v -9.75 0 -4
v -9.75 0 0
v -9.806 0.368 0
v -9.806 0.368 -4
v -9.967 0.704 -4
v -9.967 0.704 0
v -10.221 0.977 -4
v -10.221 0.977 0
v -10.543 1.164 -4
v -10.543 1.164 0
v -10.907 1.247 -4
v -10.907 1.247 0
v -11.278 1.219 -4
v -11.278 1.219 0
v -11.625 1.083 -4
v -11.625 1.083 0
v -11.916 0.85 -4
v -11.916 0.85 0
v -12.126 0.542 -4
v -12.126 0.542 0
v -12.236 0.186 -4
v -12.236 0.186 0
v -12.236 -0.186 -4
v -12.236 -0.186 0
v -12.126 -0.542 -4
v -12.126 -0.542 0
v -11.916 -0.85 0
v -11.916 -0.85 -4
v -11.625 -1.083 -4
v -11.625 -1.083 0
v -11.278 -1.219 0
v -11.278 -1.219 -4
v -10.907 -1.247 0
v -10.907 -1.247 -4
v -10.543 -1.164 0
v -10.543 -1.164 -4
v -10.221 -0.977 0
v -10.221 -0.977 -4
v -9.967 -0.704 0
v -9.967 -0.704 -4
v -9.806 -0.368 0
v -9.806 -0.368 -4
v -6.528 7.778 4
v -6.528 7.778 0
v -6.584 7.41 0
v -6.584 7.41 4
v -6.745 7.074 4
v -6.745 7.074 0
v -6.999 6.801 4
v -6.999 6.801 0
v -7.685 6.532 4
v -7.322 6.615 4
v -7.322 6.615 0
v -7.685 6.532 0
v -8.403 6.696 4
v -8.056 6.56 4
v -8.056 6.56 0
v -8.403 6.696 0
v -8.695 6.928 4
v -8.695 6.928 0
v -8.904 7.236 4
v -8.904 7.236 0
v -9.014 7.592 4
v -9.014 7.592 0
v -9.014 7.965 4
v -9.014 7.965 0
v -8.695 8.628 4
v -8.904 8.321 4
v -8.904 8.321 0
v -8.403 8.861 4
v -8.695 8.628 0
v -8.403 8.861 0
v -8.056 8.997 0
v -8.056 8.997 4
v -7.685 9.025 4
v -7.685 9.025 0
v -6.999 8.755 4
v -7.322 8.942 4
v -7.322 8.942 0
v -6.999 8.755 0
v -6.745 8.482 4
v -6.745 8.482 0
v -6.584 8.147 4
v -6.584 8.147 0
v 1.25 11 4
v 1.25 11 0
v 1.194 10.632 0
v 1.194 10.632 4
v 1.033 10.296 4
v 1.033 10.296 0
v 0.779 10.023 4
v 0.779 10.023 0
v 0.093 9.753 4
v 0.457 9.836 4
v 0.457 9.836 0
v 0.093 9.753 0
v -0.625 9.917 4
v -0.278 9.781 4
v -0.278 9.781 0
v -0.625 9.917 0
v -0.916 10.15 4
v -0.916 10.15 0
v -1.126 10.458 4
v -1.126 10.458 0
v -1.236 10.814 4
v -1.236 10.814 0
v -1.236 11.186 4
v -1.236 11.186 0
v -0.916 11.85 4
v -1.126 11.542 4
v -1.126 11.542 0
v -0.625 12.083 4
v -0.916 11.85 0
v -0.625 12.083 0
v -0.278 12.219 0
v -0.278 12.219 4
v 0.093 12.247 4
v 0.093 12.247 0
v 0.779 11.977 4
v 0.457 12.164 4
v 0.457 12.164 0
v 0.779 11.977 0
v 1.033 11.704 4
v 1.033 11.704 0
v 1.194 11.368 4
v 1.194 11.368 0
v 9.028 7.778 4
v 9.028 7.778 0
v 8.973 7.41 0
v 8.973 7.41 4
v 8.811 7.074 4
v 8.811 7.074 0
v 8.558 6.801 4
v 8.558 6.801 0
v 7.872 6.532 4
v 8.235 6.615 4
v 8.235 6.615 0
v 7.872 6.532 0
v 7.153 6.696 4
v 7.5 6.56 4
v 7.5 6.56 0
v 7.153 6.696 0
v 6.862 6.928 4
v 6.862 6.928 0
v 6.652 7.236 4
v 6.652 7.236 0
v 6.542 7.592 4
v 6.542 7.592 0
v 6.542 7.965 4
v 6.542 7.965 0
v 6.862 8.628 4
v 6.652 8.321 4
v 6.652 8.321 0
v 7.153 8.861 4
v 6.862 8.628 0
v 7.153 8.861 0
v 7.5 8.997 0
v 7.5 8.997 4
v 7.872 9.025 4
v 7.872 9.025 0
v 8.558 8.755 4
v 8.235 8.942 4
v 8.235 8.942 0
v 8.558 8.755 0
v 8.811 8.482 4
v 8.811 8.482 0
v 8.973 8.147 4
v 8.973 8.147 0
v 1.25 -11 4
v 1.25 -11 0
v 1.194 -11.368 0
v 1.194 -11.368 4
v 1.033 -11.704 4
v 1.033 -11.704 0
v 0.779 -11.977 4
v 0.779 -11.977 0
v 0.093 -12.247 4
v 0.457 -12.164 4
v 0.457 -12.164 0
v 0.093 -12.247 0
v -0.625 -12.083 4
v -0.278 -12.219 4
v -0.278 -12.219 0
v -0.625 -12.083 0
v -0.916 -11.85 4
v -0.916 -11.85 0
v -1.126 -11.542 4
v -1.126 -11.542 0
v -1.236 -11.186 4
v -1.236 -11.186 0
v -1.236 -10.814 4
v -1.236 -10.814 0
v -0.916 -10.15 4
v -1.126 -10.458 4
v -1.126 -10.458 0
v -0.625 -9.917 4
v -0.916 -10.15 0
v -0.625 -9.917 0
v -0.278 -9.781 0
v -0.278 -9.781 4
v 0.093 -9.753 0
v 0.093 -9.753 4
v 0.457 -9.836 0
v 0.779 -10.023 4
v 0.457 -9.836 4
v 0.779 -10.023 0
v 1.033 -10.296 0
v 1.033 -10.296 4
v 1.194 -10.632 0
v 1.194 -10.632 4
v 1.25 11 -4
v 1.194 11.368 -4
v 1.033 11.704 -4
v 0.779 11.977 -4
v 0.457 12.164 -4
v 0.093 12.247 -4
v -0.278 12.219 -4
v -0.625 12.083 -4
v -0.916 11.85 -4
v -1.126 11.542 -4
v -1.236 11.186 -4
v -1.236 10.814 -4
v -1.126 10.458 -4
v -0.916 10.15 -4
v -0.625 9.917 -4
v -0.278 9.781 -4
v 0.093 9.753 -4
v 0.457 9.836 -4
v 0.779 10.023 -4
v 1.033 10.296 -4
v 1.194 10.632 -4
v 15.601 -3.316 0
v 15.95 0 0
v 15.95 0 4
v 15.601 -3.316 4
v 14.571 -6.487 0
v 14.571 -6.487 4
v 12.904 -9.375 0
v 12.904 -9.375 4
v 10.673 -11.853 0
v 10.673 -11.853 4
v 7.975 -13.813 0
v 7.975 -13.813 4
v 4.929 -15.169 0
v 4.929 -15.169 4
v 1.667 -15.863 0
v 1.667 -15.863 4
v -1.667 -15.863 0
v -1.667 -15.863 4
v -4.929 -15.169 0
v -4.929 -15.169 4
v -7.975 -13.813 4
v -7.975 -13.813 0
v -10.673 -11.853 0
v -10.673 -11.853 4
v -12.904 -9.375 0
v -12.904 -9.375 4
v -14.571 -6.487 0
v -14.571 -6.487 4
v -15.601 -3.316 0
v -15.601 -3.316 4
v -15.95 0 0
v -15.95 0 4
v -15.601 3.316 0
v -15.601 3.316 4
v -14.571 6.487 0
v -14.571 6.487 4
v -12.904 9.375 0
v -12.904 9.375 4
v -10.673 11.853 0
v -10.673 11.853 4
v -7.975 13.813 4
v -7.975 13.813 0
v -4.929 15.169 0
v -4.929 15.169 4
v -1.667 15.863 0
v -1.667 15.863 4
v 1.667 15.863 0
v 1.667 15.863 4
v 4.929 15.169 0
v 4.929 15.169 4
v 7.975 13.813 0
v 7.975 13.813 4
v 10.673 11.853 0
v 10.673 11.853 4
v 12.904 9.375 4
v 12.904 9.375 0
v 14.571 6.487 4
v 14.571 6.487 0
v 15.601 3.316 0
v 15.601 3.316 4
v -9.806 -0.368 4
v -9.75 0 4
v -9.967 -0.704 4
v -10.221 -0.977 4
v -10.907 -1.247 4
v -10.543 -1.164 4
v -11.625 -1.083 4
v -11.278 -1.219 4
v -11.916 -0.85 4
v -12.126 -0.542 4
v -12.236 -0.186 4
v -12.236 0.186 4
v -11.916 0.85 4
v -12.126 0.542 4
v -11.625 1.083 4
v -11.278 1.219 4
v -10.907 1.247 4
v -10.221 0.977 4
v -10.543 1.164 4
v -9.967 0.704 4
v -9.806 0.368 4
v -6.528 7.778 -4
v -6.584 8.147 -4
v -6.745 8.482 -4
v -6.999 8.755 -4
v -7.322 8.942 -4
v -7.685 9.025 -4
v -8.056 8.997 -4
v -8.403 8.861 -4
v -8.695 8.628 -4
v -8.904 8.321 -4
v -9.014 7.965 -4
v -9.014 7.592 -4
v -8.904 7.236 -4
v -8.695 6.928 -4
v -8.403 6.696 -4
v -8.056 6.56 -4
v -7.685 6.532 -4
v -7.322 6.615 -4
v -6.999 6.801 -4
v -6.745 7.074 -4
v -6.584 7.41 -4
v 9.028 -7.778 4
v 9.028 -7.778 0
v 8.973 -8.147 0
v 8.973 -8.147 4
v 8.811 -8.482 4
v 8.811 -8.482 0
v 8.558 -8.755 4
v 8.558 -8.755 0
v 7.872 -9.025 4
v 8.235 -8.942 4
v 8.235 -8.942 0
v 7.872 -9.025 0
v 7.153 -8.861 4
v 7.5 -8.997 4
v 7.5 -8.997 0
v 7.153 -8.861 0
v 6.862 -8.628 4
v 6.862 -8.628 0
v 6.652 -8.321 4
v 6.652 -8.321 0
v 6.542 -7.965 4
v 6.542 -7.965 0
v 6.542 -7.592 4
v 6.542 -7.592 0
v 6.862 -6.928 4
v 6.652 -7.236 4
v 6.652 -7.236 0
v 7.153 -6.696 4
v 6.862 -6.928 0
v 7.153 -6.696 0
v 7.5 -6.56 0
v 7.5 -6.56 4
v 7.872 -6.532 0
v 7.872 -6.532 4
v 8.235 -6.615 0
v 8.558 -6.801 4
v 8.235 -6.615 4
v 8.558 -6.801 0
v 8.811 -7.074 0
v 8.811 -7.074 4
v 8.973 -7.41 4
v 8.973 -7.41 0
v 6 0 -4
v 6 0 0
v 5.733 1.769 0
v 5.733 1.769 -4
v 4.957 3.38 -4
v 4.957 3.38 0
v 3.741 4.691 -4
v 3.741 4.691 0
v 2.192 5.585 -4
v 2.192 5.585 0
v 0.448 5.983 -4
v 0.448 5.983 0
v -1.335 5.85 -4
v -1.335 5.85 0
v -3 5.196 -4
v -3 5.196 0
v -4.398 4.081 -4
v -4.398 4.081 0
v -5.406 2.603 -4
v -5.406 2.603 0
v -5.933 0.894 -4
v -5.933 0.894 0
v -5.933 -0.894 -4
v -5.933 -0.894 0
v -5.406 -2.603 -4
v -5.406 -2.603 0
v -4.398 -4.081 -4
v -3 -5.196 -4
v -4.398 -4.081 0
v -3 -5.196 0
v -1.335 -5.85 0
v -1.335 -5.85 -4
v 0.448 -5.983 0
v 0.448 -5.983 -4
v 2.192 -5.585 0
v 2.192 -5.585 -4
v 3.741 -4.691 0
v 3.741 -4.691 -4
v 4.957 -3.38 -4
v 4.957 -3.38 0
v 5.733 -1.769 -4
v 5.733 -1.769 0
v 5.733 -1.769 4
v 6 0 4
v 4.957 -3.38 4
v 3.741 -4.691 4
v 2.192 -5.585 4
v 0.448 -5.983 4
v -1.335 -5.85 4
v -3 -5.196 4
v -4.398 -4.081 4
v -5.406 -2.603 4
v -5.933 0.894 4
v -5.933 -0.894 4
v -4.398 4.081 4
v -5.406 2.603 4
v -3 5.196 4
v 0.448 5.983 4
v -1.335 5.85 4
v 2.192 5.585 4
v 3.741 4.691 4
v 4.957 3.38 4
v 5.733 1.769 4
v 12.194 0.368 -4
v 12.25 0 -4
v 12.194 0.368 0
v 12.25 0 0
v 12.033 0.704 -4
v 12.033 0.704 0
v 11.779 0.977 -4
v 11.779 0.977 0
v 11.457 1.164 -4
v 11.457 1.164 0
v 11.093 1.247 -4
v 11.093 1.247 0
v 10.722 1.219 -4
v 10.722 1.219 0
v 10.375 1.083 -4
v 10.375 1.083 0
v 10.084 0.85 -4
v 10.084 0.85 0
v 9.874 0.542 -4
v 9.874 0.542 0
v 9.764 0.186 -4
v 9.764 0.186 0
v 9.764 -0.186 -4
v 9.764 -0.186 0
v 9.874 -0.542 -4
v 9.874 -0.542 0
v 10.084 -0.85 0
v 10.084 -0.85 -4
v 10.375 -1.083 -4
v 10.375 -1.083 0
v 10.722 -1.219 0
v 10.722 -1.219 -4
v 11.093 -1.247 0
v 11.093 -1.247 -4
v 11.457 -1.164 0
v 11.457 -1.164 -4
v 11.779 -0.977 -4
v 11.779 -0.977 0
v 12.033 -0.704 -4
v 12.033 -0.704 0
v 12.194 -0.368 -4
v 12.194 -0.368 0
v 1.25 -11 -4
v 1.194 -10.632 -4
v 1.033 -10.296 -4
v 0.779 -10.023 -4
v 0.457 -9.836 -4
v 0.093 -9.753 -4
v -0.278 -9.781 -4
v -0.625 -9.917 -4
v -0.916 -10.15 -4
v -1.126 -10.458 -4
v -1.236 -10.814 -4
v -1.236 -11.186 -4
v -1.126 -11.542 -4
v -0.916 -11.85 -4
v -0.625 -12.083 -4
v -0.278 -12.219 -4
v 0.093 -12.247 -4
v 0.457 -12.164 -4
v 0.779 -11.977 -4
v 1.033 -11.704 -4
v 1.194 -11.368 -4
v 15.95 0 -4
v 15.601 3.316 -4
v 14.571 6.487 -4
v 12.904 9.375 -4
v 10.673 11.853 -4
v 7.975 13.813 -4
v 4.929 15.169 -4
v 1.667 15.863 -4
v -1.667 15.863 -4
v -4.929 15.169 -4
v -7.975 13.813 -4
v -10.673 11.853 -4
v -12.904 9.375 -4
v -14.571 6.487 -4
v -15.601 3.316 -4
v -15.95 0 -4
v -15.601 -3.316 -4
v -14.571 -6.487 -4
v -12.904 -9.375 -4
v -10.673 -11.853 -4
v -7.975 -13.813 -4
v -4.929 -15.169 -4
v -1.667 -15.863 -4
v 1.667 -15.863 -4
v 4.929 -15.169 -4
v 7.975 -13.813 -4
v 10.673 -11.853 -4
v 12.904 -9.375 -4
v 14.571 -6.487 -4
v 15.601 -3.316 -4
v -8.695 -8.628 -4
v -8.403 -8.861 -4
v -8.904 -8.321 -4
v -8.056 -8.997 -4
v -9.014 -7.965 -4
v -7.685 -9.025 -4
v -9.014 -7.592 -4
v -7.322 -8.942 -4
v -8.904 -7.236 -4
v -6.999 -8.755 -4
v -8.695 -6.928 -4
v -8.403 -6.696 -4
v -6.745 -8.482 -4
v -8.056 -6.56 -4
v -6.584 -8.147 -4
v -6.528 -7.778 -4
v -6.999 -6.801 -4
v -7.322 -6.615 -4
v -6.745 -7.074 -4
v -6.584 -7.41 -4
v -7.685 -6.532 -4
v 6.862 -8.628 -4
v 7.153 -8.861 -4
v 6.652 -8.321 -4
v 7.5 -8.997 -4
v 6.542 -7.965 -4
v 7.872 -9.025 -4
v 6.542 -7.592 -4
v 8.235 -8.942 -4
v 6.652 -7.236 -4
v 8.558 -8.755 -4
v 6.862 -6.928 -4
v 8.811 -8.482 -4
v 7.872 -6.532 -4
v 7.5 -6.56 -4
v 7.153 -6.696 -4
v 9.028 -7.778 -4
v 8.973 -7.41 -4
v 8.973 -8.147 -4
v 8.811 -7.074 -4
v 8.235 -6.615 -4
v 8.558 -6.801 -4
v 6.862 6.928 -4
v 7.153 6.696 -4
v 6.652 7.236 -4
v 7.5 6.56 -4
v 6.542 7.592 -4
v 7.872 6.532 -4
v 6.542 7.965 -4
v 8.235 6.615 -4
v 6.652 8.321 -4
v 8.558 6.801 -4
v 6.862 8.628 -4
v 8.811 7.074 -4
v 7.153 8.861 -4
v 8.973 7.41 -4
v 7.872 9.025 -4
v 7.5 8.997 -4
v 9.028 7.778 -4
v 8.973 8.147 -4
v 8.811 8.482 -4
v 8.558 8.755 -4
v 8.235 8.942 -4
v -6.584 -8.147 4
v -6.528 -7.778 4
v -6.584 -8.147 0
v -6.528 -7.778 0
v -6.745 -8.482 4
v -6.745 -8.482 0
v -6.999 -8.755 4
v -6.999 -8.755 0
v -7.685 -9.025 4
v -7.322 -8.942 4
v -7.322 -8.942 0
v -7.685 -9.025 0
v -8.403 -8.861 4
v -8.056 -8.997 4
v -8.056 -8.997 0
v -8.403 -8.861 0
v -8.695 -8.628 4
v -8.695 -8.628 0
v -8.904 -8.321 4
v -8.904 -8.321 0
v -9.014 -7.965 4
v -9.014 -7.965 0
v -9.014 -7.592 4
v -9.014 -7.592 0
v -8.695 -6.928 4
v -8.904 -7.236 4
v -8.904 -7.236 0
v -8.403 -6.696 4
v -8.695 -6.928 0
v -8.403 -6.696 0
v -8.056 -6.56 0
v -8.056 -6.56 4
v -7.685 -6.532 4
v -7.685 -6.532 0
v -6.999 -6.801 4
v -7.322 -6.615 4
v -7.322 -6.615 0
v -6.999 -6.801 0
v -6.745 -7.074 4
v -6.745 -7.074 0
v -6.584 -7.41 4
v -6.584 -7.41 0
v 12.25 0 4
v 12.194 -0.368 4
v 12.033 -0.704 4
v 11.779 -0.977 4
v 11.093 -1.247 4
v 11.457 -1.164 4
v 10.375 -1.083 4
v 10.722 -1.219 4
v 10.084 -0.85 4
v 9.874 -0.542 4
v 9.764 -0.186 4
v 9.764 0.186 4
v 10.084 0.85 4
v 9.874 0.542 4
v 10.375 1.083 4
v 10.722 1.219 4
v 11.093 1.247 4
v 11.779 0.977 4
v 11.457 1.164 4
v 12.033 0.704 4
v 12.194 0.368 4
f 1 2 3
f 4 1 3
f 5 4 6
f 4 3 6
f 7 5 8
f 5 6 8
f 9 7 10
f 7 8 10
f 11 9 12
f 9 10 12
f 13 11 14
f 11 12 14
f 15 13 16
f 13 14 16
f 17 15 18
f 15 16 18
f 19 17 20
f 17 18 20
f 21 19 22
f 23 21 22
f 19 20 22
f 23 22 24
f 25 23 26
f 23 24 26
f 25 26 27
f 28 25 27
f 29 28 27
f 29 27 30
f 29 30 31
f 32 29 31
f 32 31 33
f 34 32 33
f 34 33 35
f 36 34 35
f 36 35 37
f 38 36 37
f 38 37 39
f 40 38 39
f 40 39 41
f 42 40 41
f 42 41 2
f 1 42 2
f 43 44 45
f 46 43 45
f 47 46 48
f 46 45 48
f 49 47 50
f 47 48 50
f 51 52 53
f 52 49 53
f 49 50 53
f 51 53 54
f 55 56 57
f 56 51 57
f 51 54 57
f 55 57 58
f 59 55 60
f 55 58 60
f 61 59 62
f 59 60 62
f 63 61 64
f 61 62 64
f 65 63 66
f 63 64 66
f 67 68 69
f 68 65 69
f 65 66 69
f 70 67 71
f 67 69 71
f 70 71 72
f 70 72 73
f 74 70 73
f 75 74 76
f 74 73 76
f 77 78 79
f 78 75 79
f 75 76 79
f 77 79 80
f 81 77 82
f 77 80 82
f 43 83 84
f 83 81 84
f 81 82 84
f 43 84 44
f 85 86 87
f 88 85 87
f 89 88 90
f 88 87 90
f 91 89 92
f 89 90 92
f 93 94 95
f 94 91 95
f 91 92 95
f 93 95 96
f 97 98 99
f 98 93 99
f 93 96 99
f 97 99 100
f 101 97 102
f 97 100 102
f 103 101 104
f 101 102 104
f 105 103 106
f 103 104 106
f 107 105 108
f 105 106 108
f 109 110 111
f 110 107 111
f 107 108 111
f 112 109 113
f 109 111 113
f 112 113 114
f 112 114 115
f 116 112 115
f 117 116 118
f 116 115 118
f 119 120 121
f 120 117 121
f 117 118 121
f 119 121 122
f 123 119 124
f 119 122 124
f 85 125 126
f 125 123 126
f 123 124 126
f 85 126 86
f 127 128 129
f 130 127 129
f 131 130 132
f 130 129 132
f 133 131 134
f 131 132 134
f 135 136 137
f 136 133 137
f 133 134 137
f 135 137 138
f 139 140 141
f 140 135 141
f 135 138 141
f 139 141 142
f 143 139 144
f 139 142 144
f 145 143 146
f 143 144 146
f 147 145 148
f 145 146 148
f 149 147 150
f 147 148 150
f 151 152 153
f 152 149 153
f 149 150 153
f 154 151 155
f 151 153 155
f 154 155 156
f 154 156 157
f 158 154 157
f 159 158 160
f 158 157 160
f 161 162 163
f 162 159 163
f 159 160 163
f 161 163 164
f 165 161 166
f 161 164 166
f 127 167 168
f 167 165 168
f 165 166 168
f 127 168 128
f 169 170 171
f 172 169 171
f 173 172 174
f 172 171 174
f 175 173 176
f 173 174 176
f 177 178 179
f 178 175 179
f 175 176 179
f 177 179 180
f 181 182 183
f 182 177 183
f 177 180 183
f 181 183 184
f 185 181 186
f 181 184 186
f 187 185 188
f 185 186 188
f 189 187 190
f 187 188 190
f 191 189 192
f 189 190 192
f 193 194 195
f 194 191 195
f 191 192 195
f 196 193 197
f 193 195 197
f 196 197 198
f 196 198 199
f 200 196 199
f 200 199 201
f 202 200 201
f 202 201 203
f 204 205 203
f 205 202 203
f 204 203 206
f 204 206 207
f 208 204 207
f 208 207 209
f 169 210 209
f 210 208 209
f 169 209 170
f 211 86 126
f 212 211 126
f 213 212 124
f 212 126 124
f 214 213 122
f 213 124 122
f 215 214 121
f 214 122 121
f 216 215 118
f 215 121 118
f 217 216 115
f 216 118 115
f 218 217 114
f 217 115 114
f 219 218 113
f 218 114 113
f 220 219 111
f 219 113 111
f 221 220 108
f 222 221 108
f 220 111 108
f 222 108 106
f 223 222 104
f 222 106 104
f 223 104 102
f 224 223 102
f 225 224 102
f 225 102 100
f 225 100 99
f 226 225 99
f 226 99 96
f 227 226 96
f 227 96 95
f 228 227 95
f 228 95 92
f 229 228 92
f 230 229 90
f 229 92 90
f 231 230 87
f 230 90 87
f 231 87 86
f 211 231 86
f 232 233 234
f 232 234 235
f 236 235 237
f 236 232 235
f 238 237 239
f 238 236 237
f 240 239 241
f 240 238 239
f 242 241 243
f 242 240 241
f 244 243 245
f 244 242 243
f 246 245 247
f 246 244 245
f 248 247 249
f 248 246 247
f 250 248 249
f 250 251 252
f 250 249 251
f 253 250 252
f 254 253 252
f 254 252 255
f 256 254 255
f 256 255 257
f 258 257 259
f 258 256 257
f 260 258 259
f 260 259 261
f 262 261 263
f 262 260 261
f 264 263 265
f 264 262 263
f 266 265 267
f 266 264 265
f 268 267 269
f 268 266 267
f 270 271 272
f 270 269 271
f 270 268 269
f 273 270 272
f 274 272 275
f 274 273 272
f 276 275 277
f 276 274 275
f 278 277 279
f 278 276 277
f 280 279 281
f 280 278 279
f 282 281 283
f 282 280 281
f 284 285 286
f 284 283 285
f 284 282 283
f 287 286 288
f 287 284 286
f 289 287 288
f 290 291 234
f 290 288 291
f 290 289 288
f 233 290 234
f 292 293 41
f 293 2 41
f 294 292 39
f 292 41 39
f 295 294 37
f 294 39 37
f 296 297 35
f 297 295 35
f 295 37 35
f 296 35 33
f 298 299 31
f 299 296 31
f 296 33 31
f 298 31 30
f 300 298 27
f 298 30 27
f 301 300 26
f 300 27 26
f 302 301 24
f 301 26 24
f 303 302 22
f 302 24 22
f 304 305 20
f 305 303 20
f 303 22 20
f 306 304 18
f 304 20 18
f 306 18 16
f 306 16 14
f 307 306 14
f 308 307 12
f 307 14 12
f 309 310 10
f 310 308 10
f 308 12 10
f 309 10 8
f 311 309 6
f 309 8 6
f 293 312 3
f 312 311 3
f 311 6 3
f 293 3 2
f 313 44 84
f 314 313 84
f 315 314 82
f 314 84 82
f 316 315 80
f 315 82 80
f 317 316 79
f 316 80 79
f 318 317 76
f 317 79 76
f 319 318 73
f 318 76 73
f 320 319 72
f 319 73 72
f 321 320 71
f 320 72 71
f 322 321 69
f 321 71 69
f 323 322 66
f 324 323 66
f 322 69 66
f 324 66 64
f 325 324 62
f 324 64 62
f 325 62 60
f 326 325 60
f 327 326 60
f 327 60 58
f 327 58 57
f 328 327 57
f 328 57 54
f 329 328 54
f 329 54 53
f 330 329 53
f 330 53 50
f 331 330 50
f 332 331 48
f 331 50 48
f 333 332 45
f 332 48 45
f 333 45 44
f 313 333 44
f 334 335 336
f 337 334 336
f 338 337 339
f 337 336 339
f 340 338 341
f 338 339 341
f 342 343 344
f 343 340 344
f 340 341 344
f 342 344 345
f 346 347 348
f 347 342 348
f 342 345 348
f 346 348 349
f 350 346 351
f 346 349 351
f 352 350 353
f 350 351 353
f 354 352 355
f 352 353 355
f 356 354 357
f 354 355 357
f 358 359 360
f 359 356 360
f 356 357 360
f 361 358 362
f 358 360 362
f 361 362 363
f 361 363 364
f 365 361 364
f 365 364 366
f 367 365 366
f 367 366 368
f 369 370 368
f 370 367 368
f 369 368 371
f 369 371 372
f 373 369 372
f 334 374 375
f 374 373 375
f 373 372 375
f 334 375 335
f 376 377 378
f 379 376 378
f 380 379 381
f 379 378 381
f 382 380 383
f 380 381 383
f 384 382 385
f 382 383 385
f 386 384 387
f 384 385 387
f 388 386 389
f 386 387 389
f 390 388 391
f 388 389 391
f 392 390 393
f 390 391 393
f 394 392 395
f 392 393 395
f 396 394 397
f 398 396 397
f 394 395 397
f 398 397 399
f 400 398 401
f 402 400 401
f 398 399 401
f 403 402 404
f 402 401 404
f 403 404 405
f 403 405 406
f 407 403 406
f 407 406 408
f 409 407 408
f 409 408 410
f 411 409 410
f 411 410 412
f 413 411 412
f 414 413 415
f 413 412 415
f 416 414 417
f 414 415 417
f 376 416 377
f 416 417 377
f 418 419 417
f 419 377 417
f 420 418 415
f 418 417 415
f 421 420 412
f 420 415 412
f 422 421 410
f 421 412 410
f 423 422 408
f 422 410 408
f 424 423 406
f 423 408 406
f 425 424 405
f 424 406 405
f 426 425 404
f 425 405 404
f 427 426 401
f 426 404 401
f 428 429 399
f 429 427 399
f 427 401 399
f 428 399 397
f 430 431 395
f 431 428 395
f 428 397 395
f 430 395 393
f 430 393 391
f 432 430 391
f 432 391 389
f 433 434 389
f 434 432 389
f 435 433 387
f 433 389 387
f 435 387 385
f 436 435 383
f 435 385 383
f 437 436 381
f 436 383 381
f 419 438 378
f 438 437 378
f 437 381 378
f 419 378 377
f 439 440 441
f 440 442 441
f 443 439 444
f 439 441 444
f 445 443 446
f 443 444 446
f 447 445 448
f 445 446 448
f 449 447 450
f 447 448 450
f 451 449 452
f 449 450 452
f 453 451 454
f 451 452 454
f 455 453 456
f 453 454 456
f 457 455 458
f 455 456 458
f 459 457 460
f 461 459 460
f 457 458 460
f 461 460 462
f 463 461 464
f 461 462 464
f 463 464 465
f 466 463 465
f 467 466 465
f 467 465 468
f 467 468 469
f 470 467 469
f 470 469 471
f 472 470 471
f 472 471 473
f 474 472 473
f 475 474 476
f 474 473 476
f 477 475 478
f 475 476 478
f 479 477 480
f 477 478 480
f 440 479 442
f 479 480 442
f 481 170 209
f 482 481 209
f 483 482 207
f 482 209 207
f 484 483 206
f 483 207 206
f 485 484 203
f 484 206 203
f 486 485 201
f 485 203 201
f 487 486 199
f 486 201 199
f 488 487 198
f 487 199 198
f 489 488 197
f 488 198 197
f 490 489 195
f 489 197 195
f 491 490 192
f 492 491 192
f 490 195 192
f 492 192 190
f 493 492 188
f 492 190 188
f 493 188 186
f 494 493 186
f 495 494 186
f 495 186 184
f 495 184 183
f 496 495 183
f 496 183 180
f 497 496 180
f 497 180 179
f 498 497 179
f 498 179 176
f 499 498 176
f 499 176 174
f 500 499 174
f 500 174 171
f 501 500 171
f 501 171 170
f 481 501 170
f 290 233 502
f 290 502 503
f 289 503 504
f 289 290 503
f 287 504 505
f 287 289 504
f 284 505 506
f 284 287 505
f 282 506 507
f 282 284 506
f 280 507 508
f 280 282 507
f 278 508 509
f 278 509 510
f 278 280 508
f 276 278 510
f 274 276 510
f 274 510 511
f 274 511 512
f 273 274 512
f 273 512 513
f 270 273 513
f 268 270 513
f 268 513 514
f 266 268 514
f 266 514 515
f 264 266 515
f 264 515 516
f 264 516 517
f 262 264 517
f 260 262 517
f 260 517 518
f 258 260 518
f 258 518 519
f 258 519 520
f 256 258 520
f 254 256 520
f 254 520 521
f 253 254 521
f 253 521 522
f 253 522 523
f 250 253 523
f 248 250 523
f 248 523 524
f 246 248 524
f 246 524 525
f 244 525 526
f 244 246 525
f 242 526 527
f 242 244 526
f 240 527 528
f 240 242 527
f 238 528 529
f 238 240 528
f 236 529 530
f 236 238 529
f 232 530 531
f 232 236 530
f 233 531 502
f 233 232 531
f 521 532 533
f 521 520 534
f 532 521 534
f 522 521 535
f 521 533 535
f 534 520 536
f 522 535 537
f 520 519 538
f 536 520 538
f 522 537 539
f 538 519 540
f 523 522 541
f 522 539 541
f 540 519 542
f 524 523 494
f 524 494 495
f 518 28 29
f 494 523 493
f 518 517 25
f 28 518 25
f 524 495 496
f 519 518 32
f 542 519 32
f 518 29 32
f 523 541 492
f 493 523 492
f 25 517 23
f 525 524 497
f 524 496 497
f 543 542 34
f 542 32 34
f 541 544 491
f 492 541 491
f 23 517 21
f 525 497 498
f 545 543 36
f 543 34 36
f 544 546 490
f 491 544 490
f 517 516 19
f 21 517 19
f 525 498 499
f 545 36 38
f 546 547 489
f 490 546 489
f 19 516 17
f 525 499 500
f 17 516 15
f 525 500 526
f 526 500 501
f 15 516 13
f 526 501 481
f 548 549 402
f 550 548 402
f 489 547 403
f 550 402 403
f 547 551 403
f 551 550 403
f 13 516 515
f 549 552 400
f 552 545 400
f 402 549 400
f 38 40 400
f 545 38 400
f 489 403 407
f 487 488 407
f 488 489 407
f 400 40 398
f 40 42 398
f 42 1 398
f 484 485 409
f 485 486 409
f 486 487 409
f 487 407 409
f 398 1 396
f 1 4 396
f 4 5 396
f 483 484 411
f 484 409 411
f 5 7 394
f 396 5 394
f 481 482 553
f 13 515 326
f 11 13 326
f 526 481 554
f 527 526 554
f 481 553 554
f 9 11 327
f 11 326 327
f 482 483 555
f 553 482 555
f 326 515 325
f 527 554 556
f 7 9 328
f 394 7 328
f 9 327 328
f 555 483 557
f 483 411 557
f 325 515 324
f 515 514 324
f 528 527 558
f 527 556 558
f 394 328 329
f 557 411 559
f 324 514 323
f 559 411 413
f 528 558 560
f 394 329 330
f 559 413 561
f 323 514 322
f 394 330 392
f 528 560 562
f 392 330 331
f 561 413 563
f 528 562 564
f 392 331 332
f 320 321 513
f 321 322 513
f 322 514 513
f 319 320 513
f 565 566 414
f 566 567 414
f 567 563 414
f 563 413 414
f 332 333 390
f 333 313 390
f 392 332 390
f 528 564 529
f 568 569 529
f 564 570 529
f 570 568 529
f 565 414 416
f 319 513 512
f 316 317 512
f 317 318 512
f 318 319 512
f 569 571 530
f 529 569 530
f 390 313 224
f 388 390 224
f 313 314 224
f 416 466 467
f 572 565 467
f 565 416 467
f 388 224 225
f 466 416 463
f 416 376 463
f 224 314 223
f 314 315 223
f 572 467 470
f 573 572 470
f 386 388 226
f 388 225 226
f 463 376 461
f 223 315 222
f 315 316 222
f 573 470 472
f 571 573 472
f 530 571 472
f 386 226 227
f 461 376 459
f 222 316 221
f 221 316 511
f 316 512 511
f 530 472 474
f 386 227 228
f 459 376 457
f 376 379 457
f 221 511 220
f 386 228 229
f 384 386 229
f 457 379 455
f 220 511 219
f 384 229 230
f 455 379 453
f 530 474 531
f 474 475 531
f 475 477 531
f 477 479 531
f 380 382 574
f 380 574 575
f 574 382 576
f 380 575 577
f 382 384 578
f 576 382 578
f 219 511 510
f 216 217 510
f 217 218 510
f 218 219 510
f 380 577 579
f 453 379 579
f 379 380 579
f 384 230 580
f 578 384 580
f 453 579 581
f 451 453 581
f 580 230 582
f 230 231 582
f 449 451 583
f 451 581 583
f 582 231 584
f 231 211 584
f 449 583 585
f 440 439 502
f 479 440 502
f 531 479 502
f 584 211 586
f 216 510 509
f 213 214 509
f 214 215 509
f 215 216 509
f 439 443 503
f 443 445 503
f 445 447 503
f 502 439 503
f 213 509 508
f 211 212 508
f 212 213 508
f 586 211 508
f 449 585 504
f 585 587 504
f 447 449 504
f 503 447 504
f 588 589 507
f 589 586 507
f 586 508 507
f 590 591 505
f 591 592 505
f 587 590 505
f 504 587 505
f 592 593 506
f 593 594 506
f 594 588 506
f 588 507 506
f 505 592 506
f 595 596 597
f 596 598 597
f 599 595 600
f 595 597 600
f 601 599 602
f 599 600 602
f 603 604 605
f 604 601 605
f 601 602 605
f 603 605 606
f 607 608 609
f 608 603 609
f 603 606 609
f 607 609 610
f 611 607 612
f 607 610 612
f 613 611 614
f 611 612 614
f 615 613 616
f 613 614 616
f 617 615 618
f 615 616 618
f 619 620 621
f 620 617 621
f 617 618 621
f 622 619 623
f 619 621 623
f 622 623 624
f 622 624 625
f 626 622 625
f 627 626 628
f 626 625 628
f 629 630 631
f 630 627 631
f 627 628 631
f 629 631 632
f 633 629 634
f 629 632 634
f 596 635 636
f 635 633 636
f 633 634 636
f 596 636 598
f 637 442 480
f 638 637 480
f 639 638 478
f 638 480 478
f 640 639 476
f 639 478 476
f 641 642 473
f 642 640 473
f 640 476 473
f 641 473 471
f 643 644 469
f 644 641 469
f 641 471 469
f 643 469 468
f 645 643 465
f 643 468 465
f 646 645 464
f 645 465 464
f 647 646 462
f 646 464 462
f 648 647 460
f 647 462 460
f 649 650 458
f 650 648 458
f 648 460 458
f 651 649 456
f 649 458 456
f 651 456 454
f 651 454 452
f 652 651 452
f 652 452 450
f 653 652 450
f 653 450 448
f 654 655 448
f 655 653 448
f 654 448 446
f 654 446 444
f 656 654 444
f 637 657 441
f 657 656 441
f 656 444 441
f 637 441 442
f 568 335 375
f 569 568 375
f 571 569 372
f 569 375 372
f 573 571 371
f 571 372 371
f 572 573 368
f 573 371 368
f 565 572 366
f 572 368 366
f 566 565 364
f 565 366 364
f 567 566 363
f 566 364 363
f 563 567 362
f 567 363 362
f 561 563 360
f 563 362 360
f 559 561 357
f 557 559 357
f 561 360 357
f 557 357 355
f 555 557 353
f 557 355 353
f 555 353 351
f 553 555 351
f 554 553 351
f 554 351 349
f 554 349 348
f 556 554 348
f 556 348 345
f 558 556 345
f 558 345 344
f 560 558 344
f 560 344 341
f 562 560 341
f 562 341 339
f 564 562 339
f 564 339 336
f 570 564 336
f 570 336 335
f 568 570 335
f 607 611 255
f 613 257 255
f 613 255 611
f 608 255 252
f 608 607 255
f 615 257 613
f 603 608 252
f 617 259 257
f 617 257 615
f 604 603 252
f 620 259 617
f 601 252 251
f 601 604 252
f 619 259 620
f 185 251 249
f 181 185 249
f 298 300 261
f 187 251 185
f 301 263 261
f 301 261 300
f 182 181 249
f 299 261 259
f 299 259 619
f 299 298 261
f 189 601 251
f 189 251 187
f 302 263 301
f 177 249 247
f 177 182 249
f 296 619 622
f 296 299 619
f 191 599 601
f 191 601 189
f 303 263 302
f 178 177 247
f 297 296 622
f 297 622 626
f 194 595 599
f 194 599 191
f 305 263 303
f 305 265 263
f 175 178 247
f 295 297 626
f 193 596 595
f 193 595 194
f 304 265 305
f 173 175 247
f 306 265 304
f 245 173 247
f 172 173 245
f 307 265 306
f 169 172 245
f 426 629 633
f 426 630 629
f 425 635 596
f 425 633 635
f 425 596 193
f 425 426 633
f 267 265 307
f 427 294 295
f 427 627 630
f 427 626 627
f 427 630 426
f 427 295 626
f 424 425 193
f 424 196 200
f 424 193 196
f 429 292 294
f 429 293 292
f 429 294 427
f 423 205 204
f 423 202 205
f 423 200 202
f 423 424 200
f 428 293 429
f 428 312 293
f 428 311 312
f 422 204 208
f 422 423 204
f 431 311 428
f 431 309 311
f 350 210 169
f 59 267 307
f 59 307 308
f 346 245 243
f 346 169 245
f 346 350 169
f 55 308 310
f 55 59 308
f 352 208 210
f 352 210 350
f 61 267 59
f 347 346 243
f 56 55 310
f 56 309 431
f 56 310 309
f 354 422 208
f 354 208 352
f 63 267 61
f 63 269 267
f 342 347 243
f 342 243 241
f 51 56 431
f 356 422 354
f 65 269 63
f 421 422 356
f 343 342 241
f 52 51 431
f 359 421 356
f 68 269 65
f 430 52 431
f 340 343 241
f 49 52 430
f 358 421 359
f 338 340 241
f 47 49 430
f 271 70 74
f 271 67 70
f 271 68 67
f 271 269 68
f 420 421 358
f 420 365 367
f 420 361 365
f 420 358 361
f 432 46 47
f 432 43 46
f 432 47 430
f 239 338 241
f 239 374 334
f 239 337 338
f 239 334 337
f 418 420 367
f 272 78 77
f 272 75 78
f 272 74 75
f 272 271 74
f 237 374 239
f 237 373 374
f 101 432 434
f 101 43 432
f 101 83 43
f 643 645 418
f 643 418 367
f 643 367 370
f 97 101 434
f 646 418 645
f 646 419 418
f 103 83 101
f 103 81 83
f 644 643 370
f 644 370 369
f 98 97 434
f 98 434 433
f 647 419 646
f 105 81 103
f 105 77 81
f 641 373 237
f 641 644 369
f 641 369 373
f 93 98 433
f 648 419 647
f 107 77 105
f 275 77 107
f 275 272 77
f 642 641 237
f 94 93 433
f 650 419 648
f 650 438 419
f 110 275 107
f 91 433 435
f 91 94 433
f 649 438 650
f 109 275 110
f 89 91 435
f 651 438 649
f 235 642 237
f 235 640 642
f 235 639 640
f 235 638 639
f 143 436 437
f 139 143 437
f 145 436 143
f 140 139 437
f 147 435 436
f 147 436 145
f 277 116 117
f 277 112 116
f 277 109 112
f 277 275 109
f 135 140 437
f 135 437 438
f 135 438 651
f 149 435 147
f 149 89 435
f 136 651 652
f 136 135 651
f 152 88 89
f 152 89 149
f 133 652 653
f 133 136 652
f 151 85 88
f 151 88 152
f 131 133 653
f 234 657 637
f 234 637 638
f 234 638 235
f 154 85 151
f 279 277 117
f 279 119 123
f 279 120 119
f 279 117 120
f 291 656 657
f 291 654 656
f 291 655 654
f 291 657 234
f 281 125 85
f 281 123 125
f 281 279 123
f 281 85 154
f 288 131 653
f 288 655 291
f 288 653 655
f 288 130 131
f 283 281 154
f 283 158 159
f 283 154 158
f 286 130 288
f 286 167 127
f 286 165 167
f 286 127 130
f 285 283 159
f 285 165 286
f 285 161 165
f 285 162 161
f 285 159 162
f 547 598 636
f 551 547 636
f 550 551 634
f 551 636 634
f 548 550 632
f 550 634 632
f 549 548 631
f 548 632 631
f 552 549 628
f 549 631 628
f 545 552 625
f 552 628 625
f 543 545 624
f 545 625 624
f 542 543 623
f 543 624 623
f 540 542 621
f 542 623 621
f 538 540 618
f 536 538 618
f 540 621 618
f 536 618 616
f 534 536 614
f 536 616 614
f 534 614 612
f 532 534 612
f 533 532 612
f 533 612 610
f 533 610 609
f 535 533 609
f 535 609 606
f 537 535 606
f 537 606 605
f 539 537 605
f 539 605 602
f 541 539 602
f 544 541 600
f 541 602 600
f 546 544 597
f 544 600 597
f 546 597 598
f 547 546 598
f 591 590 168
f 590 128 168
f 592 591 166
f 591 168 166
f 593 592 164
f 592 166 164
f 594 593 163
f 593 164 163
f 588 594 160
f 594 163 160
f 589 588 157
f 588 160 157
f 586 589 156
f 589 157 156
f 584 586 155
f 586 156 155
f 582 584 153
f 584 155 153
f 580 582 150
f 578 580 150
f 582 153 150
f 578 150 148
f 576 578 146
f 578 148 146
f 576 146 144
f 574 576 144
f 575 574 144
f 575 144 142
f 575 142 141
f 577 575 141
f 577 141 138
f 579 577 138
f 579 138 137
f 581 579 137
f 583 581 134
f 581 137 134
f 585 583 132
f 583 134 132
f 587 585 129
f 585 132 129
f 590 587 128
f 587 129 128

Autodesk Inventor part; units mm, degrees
ref_plane "YZ Plane" through (0, 0, 0) normal (1, 0, 0) x (0, 1, 0)
ref_plane "XZ Plane" through (0, 0, 0) normal (0, 1, 0) x (-1, 0, 0)
ref_plane "XY Plane" through (0, 0, 0) normal (0, 0, 1) x (1, 0, 0)
sketch "Sketch1" plane through (0, 0, 0) normal (0, 0, 1) x (1, 0, 0)
  circle A0 centre (0, 0) radius 15.95
  circle A1 centre (0, 11) radius 1.25
  circle A2 centre (-7.7782, 7.7782) radius 1.25
  circle A3 centre (-11, 0) radius 1.25
  circle A4 centre (-7.7782, -7.7782) radius 1.25
  circle A5 centre (0, -11) radius 1.25
  circle A6 centre (7.7782, -7.7782) radius 1.25
  circle A7 centre (11, 0) radius 1.25
  circle A8 centre (7.7782, 7.7782) radius 1.25
  circle A9 centre (0, 0) radius 6
  dimension "d0" = 31.9
  dimension "d1" = 2.5
  dimension "d2" = 11
  dimension "d5" = 360
  dimension "d17" = 12
extrude "Extrusion1" add sketch "Sketch1" along normal mid plane 8
properties part number "FifthAxisShaft"
